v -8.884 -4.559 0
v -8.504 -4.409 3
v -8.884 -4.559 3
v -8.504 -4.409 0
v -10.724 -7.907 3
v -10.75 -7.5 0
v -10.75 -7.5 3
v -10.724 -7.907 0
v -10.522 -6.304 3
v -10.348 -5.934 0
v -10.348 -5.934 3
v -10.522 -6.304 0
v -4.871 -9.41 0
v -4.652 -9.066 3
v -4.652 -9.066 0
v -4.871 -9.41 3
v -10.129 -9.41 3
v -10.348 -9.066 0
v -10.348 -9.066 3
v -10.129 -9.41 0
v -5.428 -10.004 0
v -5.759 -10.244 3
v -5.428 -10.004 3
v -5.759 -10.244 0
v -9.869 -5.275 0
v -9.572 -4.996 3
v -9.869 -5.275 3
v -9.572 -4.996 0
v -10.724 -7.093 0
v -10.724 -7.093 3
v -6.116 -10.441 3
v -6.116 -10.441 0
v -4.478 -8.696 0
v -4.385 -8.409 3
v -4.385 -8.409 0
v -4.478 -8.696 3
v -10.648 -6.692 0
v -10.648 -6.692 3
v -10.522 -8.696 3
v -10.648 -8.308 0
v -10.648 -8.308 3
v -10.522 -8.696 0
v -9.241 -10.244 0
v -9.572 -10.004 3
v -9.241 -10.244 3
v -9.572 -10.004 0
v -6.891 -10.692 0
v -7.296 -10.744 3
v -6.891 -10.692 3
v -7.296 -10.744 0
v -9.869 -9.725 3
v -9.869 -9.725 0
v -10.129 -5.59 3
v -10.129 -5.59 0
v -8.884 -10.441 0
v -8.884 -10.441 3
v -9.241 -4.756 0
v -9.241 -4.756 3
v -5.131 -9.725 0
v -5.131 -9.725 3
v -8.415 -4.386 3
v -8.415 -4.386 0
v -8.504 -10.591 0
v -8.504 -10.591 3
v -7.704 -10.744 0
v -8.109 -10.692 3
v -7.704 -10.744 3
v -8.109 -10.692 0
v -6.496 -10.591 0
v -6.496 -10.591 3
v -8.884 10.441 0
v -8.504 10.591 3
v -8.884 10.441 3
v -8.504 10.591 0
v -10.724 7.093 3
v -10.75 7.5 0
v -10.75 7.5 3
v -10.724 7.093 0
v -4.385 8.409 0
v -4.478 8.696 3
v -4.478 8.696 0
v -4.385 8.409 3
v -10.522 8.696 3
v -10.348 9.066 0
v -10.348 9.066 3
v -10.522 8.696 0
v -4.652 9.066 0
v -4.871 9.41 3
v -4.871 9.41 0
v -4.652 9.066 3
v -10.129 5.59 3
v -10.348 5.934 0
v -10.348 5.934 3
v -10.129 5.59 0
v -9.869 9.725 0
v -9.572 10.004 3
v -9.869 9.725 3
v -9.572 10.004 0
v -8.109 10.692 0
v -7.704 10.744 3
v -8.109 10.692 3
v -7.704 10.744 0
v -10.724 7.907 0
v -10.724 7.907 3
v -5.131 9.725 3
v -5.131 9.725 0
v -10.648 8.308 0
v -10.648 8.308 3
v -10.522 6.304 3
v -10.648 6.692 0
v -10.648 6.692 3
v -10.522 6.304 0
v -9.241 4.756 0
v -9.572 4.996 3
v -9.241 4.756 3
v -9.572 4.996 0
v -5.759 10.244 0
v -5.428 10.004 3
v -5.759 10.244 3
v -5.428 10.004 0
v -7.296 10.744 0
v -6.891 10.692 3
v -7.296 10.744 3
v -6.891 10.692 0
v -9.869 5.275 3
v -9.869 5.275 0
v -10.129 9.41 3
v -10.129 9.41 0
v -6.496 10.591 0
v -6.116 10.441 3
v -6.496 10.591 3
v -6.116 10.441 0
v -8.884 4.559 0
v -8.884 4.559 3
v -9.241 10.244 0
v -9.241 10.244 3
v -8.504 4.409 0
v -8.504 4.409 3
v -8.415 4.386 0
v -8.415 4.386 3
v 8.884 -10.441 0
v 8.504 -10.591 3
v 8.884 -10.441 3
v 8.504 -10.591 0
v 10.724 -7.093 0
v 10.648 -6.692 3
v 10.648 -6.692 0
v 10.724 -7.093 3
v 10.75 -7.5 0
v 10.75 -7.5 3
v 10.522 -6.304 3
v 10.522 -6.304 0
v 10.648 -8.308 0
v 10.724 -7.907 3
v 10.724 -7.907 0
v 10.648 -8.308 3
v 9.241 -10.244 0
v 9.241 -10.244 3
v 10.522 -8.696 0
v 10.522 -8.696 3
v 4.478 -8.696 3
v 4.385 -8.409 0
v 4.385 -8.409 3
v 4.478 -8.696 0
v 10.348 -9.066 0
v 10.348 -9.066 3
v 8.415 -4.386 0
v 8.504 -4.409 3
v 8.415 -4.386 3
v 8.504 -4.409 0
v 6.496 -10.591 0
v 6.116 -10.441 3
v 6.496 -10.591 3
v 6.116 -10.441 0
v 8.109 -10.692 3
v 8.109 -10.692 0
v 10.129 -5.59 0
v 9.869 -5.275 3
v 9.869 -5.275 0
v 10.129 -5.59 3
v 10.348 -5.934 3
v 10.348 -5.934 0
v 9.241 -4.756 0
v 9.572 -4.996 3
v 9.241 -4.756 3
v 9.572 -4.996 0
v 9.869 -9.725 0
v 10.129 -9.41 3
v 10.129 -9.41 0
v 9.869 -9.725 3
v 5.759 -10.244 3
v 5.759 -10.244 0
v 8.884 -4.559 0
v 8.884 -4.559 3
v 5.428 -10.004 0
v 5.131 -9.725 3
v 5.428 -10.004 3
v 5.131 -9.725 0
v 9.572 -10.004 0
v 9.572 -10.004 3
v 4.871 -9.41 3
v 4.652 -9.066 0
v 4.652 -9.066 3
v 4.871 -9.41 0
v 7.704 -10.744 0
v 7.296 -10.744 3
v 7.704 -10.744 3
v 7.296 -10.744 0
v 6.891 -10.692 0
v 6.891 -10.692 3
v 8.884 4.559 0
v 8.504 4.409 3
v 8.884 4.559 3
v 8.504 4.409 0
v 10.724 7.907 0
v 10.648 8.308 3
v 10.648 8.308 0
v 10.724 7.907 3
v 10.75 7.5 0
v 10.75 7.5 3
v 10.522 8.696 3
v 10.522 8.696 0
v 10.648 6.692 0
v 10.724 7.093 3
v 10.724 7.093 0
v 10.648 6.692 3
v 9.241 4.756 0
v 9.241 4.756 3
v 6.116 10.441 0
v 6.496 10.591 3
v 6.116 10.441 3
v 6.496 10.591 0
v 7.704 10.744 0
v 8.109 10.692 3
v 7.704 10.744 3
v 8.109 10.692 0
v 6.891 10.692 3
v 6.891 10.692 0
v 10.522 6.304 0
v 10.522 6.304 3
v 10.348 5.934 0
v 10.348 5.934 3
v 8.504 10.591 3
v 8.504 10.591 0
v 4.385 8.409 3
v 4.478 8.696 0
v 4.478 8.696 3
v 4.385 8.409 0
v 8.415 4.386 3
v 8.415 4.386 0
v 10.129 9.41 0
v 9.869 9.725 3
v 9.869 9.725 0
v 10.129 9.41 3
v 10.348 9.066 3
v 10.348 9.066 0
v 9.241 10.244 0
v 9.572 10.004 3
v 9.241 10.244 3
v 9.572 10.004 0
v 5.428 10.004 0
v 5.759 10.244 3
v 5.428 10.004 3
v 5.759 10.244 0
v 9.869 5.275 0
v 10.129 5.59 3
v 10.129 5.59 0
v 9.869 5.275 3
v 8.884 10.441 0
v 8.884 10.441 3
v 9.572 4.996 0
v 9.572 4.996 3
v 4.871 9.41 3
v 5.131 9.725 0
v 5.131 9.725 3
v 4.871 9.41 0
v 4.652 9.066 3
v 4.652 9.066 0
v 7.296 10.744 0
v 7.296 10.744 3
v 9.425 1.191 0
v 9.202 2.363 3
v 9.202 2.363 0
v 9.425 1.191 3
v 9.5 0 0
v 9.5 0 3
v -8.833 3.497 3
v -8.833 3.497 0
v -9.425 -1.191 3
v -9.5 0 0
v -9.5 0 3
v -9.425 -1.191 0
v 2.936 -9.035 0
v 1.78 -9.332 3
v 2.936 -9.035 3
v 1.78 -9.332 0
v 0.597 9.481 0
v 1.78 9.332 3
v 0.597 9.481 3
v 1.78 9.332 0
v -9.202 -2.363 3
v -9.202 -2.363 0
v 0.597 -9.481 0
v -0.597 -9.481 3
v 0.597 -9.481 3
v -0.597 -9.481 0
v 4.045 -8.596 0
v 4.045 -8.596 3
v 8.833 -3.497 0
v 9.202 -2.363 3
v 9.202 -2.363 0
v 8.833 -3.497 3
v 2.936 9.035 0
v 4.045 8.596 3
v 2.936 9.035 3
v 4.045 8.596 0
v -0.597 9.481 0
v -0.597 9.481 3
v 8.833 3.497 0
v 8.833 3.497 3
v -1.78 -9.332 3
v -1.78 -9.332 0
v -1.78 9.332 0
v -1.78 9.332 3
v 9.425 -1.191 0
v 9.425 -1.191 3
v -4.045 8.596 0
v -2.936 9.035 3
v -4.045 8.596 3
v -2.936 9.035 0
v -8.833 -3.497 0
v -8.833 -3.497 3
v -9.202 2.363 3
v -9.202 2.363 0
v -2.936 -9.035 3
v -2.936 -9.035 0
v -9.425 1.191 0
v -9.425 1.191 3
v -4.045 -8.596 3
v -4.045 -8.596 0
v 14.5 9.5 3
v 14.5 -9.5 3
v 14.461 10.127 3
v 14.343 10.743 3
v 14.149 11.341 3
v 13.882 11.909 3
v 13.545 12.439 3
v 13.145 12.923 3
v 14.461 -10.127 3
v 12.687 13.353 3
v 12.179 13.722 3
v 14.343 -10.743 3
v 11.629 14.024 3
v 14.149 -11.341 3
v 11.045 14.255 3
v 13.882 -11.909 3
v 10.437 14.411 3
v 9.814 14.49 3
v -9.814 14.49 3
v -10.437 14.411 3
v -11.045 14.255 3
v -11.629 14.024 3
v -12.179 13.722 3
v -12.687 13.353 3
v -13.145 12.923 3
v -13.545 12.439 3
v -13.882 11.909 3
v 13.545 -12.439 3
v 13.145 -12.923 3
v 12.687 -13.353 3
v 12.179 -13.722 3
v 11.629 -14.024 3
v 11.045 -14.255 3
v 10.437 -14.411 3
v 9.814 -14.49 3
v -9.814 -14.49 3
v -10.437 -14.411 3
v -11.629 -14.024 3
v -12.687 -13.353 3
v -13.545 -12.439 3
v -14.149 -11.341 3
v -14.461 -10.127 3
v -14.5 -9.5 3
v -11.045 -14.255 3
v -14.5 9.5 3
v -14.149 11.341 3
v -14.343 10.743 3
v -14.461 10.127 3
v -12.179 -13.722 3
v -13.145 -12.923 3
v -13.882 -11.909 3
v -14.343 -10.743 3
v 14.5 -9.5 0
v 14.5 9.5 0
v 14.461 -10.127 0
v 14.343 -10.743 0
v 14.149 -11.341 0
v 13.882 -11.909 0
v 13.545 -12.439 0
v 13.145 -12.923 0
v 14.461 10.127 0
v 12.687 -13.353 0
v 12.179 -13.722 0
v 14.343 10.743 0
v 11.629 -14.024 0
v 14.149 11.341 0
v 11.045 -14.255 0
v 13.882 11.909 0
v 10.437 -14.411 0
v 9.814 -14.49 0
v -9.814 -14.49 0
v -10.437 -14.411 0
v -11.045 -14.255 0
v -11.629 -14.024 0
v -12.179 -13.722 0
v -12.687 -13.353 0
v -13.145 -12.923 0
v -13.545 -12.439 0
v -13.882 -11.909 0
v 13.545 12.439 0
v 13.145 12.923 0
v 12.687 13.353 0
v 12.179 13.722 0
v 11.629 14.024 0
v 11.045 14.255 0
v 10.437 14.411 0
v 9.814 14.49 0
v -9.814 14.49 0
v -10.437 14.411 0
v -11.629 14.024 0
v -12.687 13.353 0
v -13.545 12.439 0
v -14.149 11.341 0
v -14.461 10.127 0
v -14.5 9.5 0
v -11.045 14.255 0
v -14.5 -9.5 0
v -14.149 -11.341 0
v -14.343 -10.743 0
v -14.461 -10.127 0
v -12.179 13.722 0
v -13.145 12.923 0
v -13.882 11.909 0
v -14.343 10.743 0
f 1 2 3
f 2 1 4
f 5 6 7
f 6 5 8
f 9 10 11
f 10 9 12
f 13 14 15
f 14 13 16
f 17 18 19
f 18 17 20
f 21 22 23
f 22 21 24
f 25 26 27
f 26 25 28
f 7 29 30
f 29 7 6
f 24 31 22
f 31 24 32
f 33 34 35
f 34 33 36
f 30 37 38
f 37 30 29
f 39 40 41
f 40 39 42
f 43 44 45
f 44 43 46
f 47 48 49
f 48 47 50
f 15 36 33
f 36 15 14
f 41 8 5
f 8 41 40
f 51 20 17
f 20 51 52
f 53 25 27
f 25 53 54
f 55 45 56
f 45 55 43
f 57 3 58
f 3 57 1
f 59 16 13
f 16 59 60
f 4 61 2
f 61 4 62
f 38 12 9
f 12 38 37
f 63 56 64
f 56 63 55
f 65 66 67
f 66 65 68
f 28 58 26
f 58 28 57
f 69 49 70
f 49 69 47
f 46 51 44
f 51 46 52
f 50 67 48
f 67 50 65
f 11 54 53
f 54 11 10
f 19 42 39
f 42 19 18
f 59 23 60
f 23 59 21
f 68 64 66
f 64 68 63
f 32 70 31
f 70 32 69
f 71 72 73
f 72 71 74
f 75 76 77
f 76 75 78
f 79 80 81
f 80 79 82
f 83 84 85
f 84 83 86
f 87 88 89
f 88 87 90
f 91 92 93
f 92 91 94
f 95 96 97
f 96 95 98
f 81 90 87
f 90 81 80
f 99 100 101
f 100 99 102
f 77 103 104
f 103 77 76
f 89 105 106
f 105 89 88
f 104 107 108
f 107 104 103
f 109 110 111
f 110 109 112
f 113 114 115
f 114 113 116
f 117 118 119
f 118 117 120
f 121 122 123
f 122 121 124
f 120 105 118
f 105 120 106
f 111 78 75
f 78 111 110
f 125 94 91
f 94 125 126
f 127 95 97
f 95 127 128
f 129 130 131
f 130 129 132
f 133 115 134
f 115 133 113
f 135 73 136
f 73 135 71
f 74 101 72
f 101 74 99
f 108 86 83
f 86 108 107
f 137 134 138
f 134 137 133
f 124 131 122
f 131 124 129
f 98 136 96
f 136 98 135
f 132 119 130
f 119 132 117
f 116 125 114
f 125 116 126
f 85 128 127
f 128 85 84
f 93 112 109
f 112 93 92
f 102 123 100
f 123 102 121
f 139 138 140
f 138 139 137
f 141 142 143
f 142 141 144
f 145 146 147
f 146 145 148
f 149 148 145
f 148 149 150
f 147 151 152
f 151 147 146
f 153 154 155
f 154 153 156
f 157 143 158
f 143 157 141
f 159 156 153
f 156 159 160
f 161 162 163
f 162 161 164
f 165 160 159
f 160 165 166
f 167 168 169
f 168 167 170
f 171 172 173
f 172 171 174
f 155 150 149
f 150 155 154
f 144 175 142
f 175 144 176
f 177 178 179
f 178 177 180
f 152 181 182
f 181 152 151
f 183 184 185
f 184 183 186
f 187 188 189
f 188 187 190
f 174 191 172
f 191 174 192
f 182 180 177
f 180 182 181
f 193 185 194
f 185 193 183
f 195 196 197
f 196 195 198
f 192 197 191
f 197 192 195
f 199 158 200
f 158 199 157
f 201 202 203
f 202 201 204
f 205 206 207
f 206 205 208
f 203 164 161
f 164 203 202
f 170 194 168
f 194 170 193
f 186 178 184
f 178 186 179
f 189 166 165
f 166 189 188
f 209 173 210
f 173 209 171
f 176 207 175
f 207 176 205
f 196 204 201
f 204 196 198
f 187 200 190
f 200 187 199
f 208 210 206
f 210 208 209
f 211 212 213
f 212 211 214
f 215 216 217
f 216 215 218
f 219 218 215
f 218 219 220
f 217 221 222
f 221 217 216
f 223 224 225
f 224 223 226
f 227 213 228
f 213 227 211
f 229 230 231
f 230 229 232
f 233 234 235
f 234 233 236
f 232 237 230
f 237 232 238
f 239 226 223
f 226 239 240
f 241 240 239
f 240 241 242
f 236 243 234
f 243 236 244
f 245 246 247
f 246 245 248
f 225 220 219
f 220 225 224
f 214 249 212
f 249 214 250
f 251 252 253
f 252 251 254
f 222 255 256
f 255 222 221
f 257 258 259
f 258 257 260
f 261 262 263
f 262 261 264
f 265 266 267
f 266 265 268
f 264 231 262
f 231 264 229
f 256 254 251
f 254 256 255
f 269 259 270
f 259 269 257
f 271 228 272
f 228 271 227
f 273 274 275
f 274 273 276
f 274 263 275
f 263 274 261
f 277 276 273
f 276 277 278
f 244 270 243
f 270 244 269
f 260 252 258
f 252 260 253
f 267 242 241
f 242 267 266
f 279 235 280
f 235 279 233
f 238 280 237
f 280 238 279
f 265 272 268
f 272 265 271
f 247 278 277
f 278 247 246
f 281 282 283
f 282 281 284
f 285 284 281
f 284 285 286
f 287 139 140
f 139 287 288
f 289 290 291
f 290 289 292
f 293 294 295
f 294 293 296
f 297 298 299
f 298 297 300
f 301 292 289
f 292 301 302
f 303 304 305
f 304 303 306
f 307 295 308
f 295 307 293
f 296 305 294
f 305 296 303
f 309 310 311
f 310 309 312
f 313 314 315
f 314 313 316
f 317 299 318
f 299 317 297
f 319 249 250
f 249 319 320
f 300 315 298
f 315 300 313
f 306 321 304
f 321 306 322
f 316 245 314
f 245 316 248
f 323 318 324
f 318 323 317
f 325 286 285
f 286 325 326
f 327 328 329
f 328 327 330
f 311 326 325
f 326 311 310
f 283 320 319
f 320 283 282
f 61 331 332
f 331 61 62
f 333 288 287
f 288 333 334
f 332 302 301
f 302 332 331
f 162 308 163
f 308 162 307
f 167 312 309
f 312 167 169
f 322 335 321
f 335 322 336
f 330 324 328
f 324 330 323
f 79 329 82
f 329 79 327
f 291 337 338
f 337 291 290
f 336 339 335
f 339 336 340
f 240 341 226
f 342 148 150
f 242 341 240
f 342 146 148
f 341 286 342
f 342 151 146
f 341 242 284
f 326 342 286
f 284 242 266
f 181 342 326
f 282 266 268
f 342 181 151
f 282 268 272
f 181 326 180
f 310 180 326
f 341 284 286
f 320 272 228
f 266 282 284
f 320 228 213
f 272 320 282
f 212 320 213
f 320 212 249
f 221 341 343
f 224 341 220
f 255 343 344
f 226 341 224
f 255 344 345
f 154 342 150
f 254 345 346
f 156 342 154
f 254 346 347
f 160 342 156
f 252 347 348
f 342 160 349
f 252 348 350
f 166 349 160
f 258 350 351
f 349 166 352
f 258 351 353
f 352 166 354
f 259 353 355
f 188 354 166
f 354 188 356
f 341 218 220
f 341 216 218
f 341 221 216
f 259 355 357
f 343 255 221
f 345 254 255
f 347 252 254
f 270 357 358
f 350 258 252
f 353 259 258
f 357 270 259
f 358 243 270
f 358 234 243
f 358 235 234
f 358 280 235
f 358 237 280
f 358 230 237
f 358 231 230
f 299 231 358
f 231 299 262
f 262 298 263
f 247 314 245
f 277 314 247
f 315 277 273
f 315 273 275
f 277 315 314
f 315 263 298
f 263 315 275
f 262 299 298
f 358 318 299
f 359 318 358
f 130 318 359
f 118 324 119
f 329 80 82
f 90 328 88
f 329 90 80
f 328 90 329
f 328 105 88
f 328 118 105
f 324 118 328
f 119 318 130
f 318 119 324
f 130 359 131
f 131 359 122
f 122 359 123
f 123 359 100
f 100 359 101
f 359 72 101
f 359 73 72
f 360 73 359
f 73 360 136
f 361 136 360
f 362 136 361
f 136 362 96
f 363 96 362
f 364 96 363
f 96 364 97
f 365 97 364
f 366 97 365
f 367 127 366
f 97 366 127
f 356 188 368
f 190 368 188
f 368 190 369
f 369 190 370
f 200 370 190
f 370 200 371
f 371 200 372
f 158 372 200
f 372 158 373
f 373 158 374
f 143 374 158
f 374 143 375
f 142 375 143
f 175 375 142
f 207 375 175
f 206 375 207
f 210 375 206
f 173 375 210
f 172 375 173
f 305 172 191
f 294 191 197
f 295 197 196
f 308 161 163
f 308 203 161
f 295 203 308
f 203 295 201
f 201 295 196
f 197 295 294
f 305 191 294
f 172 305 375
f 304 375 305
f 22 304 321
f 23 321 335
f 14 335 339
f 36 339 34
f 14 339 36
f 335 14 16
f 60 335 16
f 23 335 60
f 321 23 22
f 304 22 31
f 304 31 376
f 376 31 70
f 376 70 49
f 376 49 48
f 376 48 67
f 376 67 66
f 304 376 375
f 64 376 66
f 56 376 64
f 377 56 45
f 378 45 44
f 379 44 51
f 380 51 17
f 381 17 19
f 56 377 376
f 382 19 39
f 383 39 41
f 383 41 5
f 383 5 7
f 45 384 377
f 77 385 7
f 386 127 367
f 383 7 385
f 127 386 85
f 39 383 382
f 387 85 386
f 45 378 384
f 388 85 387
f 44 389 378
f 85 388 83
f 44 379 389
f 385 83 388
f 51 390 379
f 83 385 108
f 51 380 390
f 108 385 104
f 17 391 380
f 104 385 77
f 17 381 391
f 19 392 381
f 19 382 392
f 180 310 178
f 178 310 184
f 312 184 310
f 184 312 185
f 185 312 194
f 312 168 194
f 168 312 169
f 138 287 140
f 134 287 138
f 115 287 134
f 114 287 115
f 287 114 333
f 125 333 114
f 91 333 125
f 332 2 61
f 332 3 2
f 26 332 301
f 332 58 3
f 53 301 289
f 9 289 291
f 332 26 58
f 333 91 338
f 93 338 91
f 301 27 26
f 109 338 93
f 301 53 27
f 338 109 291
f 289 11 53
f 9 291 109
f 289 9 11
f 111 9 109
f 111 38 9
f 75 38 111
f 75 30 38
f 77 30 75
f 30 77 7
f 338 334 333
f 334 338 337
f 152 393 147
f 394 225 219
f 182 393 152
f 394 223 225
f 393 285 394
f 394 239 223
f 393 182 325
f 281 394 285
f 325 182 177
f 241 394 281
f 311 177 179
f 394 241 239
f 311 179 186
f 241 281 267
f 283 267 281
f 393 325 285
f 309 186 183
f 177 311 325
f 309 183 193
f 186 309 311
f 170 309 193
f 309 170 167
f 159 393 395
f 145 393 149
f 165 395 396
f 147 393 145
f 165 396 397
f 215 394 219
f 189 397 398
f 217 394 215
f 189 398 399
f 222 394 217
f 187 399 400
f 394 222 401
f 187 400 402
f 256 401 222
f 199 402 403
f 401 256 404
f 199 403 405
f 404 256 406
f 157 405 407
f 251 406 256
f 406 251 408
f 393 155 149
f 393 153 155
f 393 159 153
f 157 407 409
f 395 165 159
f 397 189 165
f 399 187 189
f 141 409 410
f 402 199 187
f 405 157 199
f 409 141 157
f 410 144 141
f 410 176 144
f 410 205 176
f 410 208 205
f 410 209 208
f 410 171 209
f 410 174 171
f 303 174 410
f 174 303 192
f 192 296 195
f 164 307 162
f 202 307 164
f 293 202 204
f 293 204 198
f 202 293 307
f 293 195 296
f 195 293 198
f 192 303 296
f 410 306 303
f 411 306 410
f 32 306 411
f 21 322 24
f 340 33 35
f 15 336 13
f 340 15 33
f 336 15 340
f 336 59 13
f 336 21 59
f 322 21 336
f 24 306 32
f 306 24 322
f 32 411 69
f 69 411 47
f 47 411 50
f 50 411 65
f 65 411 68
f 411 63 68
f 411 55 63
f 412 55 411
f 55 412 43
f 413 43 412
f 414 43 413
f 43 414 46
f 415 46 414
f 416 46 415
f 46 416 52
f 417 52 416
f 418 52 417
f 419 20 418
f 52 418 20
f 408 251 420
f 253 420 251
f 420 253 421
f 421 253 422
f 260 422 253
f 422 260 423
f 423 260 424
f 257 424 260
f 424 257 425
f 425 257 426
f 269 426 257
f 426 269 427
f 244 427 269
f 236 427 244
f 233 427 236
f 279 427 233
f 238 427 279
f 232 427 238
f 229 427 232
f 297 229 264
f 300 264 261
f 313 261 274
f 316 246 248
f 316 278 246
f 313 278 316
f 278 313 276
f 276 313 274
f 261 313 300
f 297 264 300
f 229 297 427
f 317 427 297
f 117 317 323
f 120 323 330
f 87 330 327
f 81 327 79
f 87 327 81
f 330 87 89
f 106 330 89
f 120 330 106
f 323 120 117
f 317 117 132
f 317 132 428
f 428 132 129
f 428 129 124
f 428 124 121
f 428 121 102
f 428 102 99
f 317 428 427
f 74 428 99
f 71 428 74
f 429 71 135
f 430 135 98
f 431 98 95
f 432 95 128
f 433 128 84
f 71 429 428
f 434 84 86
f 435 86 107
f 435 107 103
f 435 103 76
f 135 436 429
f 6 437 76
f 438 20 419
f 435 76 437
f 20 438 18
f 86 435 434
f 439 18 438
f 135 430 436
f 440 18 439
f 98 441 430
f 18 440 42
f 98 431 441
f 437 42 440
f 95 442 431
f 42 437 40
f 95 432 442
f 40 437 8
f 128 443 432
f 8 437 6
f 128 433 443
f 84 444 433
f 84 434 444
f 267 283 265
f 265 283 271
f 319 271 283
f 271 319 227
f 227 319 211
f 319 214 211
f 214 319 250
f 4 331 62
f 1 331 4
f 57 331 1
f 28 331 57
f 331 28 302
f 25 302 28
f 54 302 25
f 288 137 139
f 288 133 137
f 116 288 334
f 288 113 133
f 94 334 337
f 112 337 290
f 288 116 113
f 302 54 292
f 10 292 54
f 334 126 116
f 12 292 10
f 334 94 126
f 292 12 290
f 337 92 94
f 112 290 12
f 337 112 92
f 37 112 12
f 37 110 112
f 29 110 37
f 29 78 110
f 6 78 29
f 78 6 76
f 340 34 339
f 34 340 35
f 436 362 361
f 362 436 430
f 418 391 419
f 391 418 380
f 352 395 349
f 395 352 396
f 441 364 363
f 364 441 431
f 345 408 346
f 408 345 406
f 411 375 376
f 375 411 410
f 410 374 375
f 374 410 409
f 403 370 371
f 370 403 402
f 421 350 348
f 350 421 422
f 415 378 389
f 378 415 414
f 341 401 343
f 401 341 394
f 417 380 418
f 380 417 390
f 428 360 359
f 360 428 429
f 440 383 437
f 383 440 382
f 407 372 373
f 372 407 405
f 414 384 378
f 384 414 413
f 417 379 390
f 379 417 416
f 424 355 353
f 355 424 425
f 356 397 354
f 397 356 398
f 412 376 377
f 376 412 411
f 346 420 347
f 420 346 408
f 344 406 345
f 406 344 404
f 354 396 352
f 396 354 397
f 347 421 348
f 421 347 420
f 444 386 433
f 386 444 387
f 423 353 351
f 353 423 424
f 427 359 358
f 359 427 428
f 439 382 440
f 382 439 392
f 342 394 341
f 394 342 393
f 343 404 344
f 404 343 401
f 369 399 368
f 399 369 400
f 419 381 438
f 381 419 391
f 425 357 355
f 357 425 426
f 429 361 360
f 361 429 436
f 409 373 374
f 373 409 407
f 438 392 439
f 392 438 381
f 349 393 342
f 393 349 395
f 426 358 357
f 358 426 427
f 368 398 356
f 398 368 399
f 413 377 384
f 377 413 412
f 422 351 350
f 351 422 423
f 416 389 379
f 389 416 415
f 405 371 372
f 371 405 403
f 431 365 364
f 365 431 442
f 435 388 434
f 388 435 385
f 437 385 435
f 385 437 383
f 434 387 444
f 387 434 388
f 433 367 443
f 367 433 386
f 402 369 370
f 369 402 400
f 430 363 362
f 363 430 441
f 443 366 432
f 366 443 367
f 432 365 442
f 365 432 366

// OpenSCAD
$fn = 50;

difference() {
	union() {
		hull() {
			translate(v = [-9.5, 9.5, 0]) {
				cylinder(h = 3, r = 5);
			}
			translate(v = [9.5, 9.5, 0]) {
				cylinder(h = 3, r = 5);
			}
			translate(v = [-9.5, -9.5, 0]) {
				cylinder(h = 3, r = 5);
			}
			translate(v = [9.5, -9.5, 0]) {
				cylinder(h = 3, r = 5);
			}
		}
	}
	union() {
		translate(v = [-7.5, -7.5, -100.0]) {
			cylinder(h = 200, r = 3.25);
		}
		translate(v = [-7.5, 7.5, -100.0]) {
			cylinder(h = 200, r = 3.25);
		}
		translate(v = [7.5, -7.5, -100.0]) {
			cylinder(h = 200, r = 3.25);
		}
		translate(v = [7.5, 7.5, -100.0]) {
			cylinder(h = 200, r = 3.25);
		}
		translate(v = [-7.5, -7.5, -100.0]) {
			cylinder(h = 200, r = 1.8);
		}
		translate(v = [-7.5, 7.5, -100.0]) {
			cylinder(h = 200, r = 1.8);
		}
		translate(v = [7.5, -7.5, -100.0]) {
			cylinder(h = 200, r = 1.8);
		}
		translate(v = [7.5, 7.5, -100.0]) {
			cylinder(h = 200, r = 1.8);
		}
		cylinder(h = 3, r = 9.5);
	}
}
